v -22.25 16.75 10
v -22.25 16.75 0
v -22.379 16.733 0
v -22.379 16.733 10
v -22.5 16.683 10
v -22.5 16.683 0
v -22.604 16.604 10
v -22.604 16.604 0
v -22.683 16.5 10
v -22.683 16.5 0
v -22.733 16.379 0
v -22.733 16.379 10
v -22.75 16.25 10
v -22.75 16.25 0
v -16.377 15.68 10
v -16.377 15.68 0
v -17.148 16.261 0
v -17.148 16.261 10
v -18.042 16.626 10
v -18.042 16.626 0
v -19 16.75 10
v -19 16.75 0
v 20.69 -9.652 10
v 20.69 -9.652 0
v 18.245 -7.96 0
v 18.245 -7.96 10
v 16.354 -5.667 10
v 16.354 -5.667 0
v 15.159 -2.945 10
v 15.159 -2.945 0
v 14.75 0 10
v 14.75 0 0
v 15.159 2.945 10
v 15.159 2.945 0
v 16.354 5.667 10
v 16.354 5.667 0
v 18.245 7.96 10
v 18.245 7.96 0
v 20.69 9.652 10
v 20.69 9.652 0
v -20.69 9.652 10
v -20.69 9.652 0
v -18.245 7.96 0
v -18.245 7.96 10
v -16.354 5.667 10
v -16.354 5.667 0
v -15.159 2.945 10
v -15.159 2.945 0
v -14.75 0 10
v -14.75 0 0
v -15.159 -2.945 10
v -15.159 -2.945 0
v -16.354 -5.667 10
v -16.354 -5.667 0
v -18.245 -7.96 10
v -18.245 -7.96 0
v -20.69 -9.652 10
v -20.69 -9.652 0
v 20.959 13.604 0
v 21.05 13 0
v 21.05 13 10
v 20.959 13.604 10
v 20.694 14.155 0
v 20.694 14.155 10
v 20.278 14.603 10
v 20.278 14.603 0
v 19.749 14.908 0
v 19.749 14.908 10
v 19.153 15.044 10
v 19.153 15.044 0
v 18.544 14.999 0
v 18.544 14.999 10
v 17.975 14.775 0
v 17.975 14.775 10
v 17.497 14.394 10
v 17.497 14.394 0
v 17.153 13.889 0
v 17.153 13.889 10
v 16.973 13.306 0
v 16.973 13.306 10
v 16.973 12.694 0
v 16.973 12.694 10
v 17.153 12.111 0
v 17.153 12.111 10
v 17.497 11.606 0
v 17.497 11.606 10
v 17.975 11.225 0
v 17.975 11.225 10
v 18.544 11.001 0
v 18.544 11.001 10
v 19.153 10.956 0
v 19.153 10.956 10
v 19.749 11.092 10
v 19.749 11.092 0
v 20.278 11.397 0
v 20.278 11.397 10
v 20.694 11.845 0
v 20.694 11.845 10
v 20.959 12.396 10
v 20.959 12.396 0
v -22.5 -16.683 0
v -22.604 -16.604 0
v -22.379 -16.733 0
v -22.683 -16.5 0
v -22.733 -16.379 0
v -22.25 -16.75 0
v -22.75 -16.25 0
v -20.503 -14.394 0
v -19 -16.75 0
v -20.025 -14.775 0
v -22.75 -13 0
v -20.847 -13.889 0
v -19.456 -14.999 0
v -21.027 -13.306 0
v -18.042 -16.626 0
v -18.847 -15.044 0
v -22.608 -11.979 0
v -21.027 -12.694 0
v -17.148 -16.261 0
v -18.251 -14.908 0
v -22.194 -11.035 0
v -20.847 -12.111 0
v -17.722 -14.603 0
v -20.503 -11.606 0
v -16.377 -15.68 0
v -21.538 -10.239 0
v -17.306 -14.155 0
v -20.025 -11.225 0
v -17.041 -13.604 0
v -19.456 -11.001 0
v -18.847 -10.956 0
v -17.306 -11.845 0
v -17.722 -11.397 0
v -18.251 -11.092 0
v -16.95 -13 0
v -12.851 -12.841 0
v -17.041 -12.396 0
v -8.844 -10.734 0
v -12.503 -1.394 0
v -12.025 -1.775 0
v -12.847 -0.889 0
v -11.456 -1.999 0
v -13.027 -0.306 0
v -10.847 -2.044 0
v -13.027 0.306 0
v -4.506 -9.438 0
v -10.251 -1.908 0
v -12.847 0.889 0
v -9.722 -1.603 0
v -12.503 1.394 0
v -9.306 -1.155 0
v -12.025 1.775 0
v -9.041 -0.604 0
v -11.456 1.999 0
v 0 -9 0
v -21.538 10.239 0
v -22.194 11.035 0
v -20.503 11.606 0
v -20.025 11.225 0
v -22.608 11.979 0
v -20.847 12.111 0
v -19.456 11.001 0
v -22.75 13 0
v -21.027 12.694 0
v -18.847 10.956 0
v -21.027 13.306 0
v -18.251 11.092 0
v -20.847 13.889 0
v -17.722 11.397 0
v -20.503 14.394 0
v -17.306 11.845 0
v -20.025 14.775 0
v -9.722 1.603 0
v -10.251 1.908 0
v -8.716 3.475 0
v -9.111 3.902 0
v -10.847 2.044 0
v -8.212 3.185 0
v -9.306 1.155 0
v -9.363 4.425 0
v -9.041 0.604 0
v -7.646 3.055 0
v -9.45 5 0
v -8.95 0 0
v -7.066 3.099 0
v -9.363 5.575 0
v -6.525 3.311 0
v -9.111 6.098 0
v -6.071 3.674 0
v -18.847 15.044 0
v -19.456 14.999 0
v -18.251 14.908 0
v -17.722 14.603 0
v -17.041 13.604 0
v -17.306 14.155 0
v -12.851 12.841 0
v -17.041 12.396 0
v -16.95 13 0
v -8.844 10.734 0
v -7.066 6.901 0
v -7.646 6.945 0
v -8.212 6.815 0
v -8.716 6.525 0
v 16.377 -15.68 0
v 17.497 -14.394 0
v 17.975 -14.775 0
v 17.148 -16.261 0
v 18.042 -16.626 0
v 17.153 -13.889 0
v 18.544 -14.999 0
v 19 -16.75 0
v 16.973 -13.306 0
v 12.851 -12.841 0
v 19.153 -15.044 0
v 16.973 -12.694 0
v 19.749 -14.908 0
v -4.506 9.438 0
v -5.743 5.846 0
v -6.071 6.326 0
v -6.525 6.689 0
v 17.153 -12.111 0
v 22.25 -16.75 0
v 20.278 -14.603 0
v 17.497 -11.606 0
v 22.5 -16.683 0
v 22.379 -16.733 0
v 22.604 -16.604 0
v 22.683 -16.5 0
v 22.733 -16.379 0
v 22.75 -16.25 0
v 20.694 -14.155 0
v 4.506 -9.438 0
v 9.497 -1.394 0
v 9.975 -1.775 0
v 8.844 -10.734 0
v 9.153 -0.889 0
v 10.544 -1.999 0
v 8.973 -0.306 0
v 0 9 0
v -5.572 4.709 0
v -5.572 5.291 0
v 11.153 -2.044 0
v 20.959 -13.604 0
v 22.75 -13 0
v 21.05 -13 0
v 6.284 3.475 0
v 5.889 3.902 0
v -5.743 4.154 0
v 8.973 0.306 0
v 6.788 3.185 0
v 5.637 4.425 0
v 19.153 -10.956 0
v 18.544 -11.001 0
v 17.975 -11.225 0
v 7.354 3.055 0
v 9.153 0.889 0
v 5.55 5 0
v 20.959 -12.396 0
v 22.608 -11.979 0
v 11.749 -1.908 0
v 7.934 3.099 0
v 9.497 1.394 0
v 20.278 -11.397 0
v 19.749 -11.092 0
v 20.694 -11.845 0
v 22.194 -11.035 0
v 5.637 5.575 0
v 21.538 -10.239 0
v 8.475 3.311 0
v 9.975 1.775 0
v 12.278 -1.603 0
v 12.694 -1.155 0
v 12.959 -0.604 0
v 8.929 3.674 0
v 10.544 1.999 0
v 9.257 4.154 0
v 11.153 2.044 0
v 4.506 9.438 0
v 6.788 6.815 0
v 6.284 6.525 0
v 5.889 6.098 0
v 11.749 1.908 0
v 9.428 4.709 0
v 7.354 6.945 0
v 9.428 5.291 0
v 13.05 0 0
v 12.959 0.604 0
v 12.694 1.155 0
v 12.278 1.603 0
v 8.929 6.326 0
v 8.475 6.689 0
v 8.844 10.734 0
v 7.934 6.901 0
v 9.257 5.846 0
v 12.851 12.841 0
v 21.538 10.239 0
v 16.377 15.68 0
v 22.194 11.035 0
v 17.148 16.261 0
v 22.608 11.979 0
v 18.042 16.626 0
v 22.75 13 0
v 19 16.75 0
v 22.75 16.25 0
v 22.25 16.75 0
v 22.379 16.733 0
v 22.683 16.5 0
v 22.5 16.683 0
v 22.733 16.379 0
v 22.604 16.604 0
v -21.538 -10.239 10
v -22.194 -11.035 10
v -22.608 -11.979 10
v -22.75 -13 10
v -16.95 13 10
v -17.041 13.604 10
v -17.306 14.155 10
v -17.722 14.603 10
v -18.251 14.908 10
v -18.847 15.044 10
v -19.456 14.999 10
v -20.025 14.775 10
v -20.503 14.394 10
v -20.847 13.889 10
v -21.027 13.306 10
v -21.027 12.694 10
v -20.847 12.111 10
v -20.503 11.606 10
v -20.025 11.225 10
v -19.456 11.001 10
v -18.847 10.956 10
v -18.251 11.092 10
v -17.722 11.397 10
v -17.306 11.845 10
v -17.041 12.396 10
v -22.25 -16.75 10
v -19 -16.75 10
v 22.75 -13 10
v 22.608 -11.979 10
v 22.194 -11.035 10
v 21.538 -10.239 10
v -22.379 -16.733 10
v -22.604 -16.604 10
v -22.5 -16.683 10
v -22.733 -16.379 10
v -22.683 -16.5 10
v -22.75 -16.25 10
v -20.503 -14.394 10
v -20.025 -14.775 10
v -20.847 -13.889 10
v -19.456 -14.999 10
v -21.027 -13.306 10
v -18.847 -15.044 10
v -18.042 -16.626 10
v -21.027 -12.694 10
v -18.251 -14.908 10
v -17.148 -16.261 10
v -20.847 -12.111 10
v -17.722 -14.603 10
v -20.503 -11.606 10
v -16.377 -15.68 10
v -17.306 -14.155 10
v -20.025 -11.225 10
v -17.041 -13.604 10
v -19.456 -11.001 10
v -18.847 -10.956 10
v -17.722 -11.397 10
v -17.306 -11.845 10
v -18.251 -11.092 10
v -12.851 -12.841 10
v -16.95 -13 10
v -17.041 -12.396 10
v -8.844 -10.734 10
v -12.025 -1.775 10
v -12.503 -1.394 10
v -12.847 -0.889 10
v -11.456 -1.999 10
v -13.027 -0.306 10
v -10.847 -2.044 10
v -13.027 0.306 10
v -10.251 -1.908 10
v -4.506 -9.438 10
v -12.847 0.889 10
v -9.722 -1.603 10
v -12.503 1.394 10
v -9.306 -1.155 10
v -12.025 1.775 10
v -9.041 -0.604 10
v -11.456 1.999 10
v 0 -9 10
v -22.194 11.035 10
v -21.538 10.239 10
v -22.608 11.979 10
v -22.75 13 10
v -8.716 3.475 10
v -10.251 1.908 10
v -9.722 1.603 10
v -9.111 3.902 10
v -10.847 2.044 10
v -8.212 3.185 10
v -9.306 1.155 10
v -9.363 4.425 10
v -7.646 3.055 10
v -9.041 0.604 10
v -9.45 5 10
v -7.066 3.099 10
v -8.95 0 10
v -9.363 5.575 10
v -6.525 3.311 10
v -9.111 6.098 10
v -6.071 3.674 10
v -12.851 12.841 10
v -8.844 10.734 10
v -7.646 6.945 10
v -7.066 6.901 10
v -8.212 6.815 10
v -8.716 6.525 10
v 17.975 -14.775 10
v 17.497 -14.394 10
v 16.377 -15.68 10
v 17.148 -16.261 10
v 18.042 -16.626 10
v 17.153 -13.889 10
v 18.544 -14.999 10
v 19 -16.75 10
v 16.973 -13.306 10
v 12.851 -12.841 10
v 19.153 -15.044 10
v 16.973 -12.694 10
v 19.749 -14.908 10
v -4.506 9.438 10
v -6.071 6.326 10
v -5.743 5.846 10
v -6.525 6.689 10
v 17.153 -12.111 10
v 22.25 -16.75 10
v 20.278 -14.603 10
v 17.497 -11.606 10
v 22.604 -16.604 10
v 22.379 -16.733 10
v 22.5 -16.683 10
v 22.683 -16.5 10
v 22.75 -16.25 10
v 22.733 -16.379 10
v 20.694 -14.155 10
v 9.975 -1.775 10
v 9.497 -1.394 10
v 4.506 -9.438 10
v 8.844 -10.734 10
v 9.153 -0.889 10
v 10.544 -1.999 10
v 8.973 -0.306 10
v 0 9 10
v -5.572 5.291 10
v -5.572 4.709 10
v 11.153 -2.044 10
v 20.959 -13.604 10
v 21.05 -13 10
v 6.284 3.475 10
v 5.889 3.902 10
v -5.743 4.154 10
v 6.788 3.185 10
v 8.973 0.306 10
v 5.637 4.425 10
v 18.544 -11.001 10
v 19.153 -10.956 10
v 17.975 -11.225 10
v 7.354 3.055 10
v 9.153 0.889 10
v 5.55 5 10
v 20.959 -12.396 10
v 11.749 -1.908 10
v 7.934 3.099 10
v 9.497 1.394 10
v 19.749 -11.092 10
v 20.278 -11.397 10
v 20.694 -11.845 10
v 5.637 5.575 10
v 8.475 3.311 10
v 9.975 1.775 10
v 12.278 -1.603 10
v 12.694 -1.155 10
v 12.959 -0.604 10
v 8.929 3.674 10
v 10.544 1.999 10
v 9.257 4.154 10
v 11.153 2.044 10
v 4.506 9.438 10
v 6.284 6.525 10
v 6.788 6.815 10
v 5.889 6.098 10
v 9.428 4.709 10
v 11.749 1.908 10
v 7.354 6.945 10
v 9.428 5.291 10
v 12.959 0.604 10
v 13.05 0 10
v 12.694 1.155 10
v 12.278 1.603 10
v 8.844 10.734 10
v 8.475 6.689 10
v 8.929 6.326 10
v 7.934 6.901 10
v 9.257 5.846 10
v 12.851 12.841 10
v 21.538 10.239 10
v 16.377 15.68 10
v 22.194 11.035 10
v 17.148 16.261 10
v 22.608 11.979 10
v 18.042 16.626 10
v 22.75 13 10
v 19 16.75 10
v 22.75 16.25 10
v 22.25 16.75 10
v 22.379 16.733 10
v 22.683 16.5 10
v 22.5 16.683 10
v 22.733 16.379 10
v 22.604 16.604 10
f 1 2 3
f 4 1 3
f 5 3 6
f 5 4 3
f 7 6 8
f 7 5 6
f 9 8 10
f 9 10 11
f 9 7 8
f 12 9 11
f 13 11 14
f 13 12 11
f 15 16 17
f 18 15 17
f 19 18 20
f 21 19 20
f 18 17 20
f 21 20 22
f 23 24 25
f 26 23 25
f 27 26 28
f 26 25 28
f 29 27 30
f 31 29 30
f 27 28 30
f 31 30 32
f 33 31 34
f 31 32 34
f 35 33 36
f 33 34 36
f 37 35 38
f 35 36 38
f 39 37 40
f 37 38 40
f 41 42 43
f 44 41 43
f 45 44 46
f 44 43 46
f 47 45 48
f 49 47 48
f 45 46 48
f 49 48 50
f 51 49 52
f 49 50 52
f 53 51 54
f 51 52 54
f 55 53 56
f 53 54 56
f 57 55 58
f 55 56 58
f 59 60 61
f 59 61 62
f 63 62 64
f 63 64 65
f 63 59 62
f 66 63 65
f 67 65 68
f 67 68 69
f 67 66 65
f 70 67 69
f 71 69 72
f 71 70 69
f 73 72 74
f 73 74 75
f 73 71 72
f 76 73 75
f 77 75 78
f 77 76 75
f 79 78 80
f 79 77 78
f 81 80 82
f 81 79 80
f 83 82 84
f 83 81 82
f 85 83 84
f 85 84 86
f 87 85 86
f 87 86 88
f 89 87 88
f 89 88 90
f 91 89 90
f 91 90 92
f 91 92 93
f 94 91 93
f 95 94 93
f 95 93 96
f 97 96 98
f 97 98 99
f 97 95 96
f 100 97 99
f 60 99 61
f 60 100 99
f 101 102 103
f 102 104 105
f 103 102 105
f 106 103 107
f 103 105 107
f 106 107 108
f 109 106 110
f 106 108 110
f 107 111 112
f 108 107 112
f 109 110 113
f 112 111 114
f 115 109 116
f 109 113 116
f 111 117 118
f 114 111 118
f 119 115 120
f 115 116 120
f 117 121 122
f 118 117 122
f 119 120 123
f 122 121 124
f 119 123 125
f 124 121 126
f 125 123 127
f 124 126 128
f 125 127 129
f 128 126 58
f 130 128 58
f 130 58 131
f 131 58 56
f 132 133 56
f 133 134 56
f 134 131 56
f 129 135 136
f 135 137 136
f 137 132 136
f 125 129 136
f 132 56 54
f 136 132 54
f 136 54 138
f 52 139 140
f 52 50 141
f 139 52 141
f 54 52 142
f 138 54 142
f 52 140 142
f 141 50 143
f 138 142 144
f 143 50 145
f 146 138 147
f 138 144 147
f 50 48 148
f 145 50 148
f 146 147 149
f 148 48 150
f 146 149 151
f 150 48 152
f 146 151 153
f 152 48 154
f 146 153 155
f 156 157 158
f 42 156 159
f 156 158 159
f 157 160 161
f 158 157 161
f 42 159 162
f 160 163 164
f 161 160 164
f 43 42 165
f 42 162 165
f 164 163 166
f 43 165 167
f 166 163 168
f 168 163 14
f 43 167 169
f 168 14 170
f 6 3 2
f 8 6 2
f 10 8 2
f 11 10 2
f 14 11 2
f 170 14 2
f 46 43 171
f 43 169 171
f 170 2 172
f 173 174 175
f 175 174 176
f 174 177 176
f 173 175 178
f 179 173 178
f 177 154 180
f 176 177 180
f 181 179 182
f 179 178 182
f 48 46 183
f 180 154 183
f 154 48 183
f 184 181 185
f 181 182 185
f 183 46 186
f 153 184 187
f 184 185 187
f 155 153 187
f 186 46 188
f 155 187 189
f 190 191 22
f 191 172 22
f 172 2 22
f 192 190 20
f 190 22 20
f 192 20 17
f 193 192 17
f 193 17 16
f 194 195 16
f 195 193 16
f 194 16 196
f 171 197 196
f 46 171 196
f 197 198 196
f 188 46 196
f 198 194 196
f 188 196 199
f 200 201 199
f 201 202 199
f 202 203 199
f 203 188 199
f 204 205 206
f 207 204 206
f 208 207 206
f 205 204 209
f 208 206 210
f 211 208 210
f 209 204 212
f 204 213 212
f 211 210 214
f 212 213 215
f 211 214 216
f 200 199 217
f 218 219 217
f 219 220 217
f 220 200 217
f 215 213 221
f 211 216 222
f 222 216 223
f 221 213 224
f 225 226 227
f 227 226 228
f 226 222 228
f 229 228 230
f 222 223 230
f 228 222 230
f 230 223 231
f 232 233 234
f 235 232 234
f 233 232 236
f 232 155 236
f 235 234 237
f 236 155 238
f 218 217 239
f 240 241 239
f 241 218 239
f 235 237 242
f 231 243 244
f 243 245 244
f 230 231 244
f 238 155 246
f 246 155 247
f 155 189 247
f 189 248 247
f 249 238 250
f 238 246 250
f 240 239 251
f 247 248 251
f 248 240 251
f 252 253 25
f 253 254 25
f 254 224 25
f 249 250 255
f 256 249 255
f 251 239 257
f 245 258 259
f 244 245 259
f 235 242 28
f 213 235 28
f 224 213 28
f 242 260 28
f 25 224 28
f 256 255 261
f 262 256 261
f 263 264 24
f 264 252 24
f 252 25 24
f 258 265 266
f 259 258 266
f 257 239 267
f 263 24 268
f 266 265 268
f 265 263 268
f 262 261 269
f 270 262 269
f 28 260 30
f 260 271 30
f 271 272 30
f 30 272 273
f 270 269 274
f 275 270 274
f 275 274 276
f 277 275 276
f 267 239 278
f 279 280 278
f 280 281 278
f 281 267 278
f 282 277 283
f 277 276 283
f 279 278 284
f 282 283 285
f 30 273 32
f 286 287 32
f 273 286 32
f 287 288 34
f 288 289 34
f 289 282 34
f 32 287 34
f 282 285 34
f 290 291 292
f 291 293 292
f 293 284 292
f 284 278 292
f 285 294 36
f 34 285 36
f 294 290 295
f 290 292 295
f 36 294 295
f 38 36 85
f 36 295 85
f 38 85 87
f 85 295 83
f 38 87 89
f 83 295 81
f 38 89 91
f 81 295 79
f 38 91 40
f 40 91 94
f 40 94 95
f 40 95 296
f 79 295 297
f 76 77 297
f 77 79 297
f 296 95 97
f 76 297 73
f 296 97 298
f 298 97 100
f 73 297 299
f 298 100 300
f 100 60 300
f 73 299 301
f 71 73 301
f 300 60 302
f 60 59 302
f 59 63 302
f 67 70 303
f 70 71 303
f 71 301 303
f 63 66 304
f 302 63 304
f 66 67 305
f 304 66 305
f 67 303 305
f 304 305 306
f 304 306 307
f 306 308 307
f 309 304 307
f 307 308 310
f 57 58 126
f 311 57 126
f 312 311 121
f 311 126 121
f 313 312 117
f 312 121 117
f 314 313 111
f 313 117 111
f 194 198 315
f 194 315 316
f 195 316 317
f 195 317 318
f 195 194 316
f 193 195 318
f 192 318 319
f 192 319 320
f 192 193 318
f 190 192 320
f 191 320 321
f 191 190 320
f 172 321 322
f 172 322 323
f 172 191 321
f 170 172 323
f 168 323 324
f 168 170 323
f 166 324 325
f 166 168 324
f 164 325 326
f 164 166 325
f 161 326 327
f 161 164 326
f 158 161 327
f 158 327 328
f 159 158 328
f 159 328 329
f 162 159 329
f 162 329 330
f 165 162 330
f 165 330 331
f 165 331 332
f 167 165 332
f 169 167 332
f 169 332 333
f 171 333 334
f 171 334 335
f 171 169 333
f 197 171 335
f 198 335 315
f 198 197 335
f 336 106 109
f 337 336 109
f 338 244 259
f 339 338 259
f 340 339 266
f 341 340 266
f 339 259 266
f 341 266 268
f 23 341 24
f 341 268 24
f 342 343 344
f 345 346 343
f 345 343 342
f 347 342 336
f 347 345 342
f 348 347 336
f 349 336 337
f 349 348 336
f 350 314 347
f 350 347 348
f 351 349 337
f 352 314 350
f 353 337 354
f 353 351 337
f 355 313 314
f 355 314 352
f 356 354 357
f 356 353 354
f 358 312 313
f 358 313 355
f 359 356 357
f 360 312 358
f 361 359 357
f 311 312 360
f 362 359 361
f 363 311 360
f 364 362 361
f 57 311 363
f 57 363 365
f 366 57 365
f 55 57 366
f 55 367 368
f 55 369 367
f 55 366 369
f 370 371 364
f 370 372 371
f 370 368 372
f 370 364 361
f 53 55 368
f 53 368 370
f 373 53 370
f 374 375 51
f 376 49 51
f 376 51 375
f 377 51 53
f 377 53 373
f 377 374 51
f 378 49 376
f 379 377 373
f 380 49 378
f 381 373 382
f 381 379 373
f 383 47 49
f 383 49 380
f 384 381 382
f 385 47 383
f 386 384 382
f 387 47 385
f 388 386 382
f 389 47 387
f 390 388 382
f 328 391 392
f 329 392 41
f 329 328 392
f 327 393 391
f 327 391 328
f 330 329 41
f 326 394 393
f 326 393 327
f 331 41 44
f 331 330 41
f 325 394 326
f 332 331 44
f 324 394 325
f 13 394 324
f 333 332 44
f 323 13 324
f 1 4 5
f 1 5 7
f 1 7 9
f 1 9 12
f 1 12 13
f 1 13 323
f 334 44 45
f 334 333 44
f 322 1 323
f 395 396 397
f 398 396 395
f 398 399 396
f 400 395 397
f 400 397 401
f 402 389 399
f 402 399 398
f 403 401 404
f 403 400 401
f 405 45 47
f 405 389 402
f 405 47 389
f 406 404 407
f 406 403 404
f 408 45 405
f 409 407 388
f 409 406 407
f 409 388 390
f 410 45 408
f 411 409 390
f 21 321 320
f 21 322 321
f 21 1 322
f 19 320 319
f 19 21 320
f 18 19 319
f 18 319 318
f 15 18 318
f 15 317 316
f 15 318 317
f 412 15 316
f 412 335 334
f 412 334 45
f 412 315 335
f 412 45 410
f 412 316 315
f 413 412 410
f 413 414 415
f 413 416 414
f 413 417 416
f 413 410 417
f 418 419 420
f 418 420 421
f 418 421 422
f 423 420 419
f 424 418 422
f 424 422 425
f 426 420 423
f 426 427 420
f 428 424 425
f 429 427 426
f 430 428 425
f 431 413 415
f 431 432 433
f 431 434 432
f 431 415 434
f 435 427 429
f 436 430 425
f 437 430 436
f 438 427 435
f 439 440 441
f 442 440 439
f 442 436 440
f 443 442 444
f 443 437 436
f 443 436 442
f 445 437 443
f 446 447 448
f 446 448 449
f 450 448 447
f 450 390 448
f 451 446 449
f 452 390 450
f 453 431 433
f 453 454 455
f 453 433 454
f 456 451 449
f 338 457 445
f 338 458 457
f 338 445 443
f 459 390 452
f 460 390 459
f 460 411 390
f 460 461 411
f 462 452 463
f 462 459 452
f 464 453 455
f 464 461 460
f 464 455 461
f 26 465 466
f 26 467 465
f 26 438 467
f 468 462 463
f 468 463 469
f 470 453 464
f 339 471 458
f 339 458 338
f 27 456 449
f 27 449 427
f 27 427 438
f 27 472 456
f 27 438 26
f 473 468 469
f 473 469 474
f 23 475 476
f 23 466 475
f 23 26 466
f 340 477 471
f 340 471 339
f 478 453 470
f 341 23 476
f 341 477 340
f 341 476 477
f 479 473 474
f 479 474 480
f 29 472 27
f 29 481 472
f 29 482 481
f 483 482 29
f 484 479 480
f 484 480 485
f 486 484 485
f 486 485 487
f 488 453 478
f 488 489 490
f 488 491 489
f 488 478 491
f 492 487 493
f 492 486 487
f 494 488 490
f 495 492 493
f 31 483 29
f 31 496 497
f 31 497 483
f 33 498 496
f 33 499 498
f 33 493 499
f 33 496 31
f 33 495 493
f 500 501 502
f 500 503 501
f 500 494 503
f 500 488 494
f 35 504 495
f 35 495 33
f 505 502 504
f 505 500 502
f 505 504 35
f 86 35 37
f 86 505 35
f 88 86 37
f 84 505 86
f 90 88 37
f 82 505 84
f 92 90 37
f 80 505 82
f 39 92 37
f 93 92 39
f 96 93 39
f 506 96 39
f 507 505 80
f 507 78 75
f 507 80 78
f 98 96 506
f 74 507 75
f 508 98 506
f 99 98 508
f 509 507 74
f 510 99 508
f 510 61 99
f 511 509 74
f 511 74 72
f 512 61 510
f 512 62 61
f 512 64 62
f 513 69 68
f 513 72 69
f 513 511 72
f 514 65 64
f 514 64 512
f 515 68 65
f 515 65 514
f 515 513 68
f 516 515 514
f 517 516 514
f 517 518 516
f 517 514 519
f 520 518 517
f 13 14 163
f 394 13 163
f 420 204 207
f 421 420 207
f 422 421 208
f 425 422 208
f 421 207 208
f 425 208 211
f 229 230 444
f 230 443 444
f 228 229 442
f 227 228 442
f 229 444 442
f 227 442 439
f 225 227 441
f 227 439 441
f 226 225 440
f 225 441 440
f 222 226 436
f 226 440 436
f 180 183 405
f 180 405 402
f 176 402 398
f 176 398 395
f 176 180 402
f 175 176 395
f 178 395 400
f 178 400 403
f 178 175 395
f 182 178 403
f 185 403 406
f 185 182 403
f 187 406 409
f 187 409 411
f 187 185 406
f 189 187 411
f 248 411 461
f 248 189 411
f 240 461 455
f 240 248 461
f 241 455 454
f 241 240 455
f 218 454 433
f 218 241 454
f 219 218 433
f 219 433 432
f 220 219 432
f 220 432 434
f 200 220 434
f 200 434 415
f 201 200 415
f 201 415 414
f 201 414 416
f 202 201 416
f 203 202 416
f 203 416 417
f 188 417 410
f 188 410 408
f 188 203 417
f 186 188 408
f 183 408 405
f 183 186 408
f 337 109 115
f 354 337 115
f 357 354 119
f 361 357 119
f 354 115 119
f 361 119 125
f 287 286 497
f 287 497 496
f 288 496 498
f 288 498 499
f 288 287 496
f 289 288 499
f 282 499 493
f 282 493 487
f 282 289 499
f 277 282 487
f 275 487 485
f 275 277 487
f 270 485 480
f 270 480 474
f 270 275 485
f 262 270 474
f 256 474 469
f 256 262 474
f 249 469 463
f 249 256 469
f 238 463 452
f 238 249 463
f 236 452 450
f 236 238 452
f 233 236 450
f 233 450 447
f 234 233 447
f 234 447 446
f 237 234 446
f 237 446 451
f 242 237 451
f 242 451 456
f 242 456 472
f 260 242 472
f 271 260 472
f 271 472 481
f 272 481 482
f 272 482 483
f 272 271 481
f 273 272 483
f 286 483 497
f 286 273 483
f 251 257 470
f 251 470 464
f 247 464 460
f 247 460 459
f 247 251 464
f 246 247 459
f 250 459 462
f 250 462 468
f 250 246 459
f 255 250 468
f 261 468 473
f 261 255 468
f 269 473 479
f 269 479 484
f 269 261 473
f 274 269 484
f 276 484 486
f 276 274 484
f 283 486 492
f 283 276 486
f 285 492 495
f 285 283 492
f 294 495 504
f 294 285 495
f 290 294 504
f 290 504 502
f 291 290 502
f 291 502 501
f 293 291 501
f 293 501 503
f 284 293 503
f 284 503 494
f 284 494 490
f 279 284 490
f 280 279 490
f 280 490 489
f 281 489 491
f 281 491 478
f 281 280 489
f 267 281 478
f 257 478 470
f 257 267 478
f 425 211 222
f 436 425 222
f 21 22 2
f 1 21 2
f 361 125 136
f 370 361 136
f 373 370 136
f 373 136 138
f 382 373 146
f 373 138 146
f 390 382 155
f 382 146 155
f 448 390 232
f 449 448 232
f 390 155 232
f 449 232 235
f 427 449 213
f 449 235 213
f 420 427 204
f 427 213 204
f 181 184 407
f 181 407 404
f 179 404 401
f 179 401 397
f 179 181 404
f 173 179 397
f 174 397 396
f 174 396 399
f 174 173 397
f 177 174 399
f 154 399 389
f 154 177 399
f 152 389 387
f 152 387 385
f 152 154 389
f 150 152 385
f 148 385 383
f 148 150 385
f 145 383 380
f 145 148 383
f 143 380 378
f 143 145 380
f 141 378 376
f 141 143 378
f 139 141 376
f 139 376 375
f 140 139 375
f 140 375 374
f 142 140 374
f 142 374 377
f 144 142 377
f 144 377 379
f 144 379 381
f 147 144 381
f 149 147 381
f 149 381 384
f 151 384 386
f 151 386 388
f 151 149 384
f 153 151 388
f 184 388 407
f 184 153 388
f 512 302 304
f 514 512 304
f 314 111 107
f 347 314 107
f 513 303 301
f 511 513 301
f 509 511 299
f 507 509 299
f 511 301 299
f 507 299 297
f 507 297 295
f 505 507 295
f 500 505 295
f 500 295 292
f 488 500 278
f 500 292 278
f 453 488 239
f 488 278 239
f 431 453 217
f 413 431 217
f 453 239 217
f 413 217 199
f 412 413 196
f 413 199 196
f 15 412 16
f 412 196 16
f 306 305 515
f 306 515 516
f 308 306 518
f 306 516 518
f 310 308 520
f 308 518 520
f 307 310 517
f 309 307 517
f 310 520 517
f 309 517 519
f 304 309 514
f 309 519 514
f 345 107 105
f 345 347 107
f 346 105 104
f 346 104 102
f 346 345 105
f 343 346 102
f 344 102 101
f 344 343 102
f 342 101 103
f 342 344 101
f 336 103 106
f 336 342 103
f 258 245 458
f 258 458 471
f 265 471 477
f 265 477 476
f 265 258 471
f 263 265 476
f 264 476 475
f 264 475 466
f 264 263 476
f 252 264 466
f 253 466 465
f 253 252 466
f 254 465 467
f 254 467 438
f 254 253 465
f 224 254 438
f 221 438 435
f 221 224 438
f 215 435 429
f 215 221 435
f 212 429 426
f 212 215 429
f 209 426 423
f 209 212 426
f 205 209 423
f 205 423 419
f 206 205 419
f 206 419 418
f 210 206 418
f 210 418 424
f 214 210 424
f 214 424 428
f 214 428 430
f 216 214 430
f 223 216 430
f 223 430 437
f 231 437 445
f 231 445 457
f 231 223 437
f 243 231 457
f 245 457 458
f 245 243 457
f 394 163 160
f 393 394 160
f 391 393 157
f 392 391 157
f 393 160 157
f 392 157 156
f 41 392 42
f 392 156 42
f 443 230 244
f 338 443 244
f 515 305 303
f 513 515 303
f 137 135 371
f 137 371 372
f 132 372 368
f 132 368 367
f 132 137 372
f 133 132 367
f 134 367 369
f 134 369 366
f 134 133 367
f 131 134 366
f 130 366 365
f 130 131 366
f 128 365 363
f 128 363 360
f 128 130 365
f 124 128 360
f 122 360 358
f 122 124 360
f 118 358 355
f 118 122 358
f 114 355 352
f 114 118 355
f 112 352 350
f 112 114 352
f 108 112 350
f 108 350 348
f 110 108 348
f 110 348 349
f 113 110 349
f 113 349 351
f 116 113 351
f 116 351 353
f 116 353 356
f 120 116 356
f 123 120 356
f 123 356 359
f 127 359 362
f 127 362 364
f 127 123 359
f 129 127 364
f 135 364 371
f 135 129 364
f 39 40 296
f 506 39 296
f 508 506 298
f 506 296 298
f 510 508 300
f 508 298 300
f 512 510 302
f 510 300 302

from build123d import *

# Parameters (mm, degrees)
SKETCH1_R           = 2.05
SKETCH1_R_2         = 1.95
BOSS_EXTRUDE1_DEPTH = 10
FILLET1_R           = 0.5


with BuildPart() as part:
    # Sketch1 → Boss-Extrude1 (new body)
    with BuildSketch(Plane.XY):
        with BuildLine():
            Line((-19, 16.75), (-22.75, 16.75))
            Line((-22.75, 16.75), (-22.75, 13))
            ThreePointArc((-22.75, 13), (-22.193718688, 11.034634654), (-20.689914163, 9.652360515))
            ThreePointArc((-20.689914163, 9.652360515), (-14.75, 0), (-20.689914163, -9.652360515))
            ThreePointArc((-20.689914163, -9.652360515), (-22.193718688, -11.034634654), (-22.75, -13))
            Line((-22.75, -13), (-22.75, -16.75))
            Line((-22.75, -16.75), (-19, -16.75))
            ThreePointArc((-19, -16.75), (-17.583685544, -16.472254795), (-16.377170848, -15.680161793))
            ThreePointArc((-16.377170848, -15.680161793), (0, -9), (16.377170848, -15.680161793))
            ThreePointArc((16.377170848, -15.680161793), (17.583685544, -16.472254795), (19, -16.75))
            Line((19, -16.75), (22.75, -16.75))
            Line((22.75, -16.75), (22.75, -13))
            ThreePointArc((22.75, -13), (22.193718688, -11.034634654), (20.689914163, -9.652360515))
            ThreePointArc((20.689914163, -9.652360515), (14.75, 0), (20.689914163, 9.652360515))
            ThreePointArc((20.689914163, 9.652360515), (22.193718688, 11.034634654), (22.75, 13))
            Line((22.75, 13), (22.75, 16.75))
            Line((22.75, 16.75), (19, 16.75))
            ThreePointArc((19, 16.75), (17.583685544, 16.472254795), (16.377170848, 15.680161793))
            ThreePointArc((16.377170848, 15.680161793), (0, 9), (-16.377170848, 15.680161793))
            ThreePointArc((-16.377170848, 15.680161793), (-17.583685544, 16.472254795), (-19, 16.75))
        make_face()
        with Locations((19, 13)):
            Circle(SKETCH1_R, mode=Mode.SUBTRACT)
        with Locations((-19, 13)):
            Circle(SKETCH1_R, mode=Mode.SUBTRACT)
        with Locations((-19, -13)):
            Circle(SKETCH1_R, mode=Mode.SUBTRACT)
        with Locations((19, -13)):
            Circle(SKETCH1_R, mode=Mode.SUBTRACT)
        with Locations((-11, 0)):
            Circle(SKETCH1_R, mode=Mode.SUBTRACT)
        with Locations((11, 0)):
            Circle(SKETCH1_R, mode=Mode.SUBTRACT)
        with Locations(Location((7.5, 5, 0), (0, 0, 180))):
            Circle(SKETCH1_R_2, mode=Mode.SUBTRACT)
        with Locations(Location((-7.5, 5, 0), (0, 0, 180))):
            Circle(SKETCH1_R_2, mode=Mode.SUBTRACT)
    extrude(amount=BOSS_EXTRUDE1_DEPTH)

    # Fillet1
    fillet1_edges = [part.edges().sort_by_distance(p)[0] for p in [
        (22.75, 16.75, 5),
        (22.75, -16.75, 5),
        (-22.75, -16.75, 5),
        (-22.75, 16.75, 5),
    ]]
    fillet(fillet1_edges, radius=FILLET1_R)


solid = part.part
